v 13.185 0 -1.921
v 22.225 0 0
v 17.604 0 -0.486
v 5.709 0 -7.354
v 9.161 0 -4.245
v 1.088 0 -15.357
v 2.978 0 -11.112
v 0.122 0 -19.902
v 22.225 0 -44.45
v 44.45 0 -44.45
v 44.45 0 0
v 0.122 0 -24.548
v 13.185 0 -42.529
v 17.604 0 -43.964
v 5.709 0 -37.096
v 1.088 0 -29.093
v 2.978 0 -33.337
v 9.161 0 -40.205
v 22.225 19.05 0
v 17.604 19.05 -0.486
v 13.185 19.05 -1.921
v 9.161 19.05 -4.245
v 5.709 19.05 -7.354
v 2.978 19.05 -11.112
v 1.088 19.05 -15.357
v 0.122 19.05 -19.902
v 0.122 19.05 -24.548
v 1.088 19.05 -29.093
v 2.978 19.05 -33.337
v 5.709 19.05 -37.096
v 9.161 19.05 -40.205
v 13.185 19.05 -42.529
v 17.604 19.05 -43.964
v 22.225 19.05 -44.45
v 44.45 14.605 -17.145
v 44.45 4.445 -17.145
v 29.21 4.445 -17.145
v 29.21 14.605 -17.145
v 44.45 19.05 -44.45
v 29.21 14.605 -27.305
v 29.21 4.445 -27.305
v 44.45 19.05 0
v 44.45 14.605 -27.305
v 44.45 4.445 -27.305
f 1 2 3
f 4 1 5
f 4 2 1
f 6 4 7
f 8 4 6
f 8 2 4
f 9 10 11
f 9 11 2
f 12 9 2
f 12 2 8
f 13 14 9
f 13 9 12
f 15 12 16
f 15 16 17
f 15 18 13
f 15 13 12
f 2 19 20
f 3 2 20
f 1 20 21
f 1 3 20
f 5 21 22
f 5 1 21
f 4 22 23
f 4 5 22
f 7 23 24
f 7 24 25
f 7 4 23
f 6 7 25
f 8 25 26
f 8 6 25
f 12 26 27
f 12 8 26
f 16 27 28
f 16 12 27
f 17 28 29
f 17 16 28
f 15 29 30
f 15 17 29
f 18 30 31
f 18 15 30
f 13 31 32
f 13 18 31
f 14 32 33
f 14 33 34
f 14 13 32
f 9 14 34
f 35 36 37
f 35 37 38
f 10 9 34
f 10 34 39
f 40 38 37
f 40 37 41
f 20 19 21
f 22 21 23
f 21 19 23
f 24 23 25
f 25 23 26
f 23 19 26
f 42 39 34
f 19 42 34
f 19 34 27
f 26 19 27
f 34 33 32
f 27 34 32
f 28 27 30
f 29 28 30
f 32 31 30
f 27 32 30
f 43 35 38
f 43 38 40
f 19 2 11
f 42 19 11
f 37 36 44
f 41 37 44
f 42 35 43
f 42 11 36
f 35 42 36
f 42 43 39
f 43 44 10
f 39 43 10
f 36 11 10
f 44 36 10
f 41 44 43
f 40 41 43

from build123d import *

# Parameters (mm, degrees)
SKETCH1_W                       = 22.225
SKETCH1_H                       = 44.45
MAIN_BODY_EXTRUDE_DEPTH         = 19.05
SKETCH2_W                       = 10.16
SKETCH2_H                       = 10.16
UPPER_FOOT_CONNECTION_CUT_DEPTH = 15.24


with BuildPart() as part:
    # Sketch1 → Main body extrude (new body)
    with BuildSketch(Plane(origin=(0, 0, 0), x_dir=(1, 0, 0), z_dir=(0, 1, 0))):
        with BuildLine():
            Line((22.225, 44.45), (22.225, 0))
            ThreePointArc((22.225, 0), (0, 22.225), (22.225, 44.45))
        make_face()
        with Locations((33.3375, 22.225)):
            Rectangle(SKETCH1_W, SKETCH1_H)
    extrude(amount=MAIN_BODY_EXTRUDE_DEPTH)

    # Sketch2 → Upper foot connection cut (cut)
    with BuildSketch(Plane(origin=(44.45, 0, 0), x_dir=(0, 0, -1), z_dir=(1, 0, 0))):
        with Locations((22.225, 9.525)):
            Rectangle(SKETCH2_W, SKETCH2_H)
    extrude(amount=-UPPER_FOOT_CONNECTION_CUT_DEPTH, mode=Mode.SUBTRACT)


solid = part.part
